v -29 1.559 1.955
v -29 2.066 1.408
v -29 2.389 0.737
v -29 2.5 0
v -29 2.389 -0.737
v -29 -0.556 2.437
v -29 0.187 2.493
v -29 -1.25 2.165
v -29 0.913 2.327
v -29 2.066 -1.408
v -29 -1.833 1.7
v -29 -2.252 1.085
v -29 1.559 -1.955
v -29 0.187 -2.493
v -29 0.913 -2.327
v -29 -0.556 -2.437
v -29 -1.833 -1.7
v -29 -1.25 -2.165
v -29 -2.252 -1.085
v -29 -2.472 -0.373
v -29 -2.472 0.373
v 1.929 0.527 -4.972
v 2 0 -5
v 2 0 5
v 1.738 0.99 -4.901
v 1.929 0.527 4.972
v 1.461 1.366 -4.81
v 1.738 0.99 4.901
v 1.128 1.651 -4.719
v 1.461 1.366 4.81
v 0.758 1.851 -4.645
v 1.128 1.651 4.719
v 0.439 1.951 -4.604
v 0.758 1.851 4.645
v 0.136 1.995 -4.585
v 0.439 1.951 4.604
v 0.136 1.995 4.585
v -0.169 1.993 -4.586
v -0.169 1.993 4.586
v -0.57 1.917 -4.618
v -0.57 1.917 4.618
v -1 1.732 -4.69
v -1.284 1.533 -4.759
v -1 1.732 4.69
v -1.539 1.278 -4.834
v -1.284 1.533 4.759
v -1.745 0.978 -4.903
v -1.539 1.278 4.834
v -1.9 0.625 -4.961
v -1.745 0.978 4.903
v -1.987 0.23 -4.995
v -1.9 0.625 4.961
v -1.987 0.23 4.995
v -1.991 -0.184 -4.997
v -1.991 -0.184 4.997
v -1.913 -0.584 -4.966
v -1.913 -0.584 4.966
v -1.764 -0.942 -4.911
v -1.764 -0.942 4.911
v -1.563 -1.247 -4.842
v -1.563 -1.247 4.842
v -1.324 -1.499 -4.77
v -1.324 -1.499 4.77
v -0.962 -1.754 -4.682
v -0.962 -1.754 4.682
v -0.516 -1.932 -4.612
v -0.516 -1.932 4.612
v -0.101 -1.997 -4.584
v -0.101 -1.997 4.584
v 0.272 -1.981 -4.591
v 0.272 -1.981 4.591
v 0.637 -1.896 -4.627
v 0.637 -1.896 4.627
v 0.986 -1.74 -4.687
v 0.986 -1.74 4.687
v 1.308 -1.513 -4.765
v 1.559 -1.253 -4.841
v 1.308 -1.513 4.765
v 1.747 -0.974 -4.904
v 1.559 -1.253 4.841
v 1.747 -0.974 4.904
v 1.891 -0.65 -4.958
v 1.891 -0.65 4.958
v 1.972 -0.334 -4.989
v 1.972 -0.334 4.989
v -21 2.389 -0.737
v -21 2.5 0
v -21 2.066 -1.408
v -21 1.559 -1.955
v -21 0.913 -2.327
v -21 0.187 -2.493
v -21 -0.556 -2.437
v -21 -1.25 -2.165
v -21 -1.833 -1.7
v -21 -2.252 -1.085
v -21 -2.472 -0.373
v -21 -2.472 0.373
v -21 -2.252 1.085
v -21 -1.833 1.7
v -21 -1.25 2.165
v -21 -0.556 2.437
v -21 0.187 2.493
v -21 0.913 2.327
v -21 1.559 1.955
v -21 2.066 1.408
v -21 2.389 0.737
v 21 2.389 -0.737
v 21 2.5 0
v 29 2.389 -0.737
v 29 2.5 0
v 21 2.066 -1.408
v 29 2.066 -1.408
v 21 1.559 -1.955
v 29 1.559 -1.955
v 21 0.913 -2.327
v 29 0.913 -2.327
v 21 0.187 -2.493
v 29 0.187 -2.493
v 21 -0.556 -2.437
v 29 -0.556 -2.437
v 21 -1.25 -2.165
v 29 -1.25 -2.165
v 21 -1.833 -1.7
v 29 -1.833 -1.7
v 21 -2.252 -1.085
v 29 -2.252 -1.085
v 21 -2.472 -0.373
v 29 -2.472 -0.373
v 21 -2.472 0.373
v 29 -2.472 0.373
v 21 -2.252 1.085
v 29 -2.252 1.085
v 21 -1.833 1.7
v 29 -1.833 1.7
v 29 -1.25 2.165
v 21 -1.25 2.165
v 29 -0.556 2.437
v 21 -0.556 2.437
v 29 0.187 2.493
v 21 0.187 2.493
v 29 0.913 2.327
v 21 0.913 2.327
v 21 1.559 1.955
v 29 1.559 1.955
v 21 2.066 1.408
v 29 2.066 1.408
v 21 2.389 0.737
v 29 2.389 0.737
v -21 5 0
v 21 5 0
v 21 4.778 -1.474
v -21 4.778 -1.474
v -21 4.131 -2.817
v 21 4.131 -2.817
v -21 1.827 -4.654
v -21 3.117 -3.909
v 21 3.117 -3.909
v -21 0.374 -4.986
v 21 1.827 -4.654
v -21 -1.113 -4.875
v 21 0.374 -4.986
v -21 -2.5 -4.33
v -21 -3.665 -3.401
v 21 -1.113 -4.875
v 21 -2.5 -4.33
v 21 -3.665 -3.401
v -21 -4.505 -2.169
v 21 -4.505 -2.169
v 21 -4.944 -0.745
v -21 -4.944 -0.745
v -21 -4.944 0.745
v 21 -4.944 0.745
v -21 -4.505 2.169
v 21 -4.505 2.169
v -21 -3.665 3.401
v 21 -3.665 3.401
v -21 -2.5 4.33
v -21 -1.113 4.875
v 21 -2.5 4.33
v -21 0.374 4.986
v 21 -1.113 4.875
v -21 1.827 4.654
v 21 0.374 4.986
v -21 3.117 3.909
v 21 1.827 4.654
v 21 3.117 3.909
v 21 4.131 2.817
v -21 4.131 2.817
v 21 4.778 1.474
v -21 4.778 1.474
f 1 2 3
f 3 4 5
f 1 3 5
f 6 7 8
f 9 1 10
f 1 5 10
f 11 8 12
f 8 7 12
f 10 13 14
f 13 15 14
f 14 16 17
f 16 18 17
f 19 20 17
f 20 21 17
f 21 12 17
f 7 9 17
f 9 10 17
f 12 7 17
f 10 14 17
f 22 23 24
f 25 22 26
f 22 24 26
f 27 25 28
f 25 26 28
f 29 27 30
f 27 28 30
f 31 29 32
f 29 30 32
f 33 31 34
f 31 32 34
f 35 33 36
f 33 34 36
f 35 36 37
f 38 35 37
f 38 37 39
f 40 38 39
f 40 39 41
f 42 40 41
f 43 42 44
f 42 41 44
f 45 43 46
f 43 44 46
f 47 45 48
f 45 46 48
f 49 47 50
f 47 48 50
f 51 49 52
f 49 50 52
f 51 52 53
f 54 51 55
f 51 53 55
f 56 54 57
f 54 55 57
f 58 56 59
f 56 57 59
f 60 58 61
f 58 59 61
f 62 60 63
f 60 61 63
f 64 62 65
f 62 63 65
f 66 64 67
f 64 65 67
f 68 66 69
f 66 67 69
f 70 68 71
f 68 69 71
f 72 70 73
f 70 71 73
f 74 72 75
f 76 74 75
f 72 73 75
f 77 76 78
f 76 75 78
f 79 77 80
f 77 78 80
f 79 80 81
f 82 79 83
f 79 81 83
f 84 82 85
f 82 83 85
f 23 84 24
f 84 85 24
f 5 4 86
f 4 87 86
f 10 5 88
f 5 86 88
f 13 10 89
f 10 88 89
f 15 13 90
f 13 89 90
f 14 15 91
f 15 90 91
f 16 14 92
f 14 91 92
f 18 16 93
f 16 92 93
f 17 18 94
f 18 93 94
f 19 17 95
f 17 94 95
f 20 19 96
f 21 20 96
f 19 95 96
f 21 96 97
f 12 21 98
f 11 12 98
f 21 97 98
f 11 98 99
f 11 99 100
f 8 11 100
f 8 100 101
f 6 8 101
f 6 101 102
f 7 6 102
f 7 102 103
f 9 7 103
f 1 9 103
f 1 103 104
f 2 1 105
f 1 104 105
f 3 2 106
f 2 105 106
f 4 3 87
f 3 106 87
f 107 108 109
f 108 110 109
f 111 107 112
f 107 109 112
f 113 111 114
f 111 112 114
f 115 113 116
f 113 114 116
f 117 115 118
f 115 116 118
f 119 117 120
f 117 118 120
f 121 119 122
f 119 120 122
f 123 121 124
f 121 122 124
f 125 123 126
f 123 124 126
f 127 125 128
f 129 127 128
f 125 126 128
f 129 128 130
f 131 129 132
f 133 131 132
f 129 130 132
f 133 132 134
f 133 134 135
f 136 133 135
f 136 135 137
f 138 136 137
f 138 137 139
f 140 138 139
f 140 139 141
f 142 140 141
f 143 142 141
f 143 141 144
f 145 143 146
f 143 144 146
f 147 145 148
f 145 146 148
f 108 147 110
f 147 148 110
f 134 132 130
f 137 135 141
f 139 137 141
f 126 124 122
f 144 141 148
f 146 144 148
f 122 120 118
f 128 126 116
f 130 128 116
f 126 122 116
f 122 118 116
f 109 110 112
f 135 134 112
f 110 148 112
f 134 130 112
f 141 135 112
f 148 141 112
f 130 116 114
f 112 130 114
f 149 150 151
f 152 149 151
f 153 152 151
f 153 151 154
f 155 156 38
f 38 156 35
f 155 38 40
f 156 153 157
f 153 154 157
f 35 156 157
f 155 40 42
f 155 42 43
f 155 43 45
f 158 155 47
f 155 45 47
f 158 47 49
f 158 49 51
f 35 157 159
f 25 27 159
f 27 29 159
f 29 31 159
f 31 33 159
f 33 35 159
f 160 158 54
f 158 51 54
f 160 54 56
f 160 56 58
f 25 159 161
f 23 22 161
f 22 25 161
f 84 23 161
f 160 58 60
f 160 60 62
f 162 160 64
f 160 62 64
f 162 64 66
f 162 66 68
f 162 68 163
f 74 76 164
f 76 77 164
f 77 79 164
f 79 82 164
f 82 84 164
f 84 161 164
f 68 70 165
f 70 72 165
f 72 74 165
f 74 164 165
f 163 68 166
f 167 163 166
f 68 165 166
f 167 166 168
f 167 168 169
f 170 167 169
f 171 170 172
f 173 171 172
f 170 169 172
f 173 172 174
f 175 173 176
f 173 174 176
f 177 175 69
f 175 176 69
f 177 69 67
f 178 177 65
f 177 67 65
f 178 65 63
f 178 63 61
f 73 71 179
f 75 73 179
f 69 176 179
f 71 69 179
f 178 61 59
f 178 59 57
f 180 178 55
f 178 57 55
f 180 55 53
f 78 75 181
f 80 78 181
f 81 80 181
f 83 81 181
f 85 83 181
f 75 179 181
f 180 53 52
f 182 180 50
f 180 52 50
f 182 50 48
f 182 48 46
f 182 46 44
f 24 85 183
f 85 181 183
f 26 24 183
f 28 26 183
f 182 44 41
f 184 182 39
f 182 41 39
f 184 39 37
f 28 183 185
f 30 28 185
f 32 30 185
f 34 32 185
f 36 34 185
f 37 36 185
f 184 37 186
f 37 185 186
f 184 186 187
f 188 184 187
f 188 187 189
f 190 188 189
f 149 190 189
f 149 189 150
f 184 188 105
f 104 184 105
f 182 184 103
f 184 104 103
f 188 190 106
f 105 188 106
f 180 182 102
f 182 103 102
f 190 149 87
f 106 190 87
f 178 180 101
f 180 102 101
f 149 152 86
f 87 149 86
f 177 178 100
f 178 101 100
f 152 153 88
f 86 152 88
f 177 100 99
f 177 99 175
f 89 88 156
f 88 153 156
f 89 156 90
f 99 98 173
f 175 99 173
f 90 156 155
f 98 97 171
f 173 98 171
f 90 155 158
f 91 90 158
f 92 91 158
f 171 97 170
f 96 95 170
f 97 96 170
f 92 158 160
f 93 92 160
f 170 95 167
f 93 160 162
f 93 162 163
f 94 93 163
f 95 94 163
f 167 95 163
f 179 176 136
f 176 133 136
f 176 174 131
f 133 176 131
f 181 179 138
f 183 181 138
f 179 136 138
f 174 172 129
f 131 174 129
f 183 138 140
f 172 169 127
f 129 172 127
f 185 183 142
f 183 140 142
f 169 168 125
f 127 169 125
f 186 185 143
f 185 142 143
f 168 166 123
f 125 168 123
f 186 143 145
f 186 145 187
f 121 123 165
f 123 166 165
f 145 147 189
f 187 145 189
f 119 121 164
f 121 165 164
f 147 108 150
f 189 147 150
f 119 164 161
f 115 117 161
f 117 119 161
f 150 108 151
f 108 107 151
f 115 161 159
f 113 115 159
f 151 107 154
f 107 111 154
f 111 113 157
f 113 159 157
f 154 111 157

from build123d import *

# Parameters (mm, degrees)
SKETCH_3_R          = 2
CUT_EXTRUDE_1_DEPTH = 10


with BuildPart() as part:
    # 草圖1 → 旋轉1 (revolve)
    with BuildSketch(Plane.XY):
        Polygon((-29, 0), (-29, 2.5), (-21, 2.5), (-21, 5), (21, 5), (21, 2.5), (29, 2.5), (29, 0), align=None)
    revolve(axis=Axis((29, 0, 0), (-1, 0, 0)))

    # 草圖3 → 除料-伸長1 (cut, symmetric)
    with BuildSketch(Plane.XY):
        Circle(SKETCH_3_R)
    extrude(amount=CUT_EXTRUDE_1_DEPTH, both=True, mode=Mode.SUBTRACT)


solid = part.part
